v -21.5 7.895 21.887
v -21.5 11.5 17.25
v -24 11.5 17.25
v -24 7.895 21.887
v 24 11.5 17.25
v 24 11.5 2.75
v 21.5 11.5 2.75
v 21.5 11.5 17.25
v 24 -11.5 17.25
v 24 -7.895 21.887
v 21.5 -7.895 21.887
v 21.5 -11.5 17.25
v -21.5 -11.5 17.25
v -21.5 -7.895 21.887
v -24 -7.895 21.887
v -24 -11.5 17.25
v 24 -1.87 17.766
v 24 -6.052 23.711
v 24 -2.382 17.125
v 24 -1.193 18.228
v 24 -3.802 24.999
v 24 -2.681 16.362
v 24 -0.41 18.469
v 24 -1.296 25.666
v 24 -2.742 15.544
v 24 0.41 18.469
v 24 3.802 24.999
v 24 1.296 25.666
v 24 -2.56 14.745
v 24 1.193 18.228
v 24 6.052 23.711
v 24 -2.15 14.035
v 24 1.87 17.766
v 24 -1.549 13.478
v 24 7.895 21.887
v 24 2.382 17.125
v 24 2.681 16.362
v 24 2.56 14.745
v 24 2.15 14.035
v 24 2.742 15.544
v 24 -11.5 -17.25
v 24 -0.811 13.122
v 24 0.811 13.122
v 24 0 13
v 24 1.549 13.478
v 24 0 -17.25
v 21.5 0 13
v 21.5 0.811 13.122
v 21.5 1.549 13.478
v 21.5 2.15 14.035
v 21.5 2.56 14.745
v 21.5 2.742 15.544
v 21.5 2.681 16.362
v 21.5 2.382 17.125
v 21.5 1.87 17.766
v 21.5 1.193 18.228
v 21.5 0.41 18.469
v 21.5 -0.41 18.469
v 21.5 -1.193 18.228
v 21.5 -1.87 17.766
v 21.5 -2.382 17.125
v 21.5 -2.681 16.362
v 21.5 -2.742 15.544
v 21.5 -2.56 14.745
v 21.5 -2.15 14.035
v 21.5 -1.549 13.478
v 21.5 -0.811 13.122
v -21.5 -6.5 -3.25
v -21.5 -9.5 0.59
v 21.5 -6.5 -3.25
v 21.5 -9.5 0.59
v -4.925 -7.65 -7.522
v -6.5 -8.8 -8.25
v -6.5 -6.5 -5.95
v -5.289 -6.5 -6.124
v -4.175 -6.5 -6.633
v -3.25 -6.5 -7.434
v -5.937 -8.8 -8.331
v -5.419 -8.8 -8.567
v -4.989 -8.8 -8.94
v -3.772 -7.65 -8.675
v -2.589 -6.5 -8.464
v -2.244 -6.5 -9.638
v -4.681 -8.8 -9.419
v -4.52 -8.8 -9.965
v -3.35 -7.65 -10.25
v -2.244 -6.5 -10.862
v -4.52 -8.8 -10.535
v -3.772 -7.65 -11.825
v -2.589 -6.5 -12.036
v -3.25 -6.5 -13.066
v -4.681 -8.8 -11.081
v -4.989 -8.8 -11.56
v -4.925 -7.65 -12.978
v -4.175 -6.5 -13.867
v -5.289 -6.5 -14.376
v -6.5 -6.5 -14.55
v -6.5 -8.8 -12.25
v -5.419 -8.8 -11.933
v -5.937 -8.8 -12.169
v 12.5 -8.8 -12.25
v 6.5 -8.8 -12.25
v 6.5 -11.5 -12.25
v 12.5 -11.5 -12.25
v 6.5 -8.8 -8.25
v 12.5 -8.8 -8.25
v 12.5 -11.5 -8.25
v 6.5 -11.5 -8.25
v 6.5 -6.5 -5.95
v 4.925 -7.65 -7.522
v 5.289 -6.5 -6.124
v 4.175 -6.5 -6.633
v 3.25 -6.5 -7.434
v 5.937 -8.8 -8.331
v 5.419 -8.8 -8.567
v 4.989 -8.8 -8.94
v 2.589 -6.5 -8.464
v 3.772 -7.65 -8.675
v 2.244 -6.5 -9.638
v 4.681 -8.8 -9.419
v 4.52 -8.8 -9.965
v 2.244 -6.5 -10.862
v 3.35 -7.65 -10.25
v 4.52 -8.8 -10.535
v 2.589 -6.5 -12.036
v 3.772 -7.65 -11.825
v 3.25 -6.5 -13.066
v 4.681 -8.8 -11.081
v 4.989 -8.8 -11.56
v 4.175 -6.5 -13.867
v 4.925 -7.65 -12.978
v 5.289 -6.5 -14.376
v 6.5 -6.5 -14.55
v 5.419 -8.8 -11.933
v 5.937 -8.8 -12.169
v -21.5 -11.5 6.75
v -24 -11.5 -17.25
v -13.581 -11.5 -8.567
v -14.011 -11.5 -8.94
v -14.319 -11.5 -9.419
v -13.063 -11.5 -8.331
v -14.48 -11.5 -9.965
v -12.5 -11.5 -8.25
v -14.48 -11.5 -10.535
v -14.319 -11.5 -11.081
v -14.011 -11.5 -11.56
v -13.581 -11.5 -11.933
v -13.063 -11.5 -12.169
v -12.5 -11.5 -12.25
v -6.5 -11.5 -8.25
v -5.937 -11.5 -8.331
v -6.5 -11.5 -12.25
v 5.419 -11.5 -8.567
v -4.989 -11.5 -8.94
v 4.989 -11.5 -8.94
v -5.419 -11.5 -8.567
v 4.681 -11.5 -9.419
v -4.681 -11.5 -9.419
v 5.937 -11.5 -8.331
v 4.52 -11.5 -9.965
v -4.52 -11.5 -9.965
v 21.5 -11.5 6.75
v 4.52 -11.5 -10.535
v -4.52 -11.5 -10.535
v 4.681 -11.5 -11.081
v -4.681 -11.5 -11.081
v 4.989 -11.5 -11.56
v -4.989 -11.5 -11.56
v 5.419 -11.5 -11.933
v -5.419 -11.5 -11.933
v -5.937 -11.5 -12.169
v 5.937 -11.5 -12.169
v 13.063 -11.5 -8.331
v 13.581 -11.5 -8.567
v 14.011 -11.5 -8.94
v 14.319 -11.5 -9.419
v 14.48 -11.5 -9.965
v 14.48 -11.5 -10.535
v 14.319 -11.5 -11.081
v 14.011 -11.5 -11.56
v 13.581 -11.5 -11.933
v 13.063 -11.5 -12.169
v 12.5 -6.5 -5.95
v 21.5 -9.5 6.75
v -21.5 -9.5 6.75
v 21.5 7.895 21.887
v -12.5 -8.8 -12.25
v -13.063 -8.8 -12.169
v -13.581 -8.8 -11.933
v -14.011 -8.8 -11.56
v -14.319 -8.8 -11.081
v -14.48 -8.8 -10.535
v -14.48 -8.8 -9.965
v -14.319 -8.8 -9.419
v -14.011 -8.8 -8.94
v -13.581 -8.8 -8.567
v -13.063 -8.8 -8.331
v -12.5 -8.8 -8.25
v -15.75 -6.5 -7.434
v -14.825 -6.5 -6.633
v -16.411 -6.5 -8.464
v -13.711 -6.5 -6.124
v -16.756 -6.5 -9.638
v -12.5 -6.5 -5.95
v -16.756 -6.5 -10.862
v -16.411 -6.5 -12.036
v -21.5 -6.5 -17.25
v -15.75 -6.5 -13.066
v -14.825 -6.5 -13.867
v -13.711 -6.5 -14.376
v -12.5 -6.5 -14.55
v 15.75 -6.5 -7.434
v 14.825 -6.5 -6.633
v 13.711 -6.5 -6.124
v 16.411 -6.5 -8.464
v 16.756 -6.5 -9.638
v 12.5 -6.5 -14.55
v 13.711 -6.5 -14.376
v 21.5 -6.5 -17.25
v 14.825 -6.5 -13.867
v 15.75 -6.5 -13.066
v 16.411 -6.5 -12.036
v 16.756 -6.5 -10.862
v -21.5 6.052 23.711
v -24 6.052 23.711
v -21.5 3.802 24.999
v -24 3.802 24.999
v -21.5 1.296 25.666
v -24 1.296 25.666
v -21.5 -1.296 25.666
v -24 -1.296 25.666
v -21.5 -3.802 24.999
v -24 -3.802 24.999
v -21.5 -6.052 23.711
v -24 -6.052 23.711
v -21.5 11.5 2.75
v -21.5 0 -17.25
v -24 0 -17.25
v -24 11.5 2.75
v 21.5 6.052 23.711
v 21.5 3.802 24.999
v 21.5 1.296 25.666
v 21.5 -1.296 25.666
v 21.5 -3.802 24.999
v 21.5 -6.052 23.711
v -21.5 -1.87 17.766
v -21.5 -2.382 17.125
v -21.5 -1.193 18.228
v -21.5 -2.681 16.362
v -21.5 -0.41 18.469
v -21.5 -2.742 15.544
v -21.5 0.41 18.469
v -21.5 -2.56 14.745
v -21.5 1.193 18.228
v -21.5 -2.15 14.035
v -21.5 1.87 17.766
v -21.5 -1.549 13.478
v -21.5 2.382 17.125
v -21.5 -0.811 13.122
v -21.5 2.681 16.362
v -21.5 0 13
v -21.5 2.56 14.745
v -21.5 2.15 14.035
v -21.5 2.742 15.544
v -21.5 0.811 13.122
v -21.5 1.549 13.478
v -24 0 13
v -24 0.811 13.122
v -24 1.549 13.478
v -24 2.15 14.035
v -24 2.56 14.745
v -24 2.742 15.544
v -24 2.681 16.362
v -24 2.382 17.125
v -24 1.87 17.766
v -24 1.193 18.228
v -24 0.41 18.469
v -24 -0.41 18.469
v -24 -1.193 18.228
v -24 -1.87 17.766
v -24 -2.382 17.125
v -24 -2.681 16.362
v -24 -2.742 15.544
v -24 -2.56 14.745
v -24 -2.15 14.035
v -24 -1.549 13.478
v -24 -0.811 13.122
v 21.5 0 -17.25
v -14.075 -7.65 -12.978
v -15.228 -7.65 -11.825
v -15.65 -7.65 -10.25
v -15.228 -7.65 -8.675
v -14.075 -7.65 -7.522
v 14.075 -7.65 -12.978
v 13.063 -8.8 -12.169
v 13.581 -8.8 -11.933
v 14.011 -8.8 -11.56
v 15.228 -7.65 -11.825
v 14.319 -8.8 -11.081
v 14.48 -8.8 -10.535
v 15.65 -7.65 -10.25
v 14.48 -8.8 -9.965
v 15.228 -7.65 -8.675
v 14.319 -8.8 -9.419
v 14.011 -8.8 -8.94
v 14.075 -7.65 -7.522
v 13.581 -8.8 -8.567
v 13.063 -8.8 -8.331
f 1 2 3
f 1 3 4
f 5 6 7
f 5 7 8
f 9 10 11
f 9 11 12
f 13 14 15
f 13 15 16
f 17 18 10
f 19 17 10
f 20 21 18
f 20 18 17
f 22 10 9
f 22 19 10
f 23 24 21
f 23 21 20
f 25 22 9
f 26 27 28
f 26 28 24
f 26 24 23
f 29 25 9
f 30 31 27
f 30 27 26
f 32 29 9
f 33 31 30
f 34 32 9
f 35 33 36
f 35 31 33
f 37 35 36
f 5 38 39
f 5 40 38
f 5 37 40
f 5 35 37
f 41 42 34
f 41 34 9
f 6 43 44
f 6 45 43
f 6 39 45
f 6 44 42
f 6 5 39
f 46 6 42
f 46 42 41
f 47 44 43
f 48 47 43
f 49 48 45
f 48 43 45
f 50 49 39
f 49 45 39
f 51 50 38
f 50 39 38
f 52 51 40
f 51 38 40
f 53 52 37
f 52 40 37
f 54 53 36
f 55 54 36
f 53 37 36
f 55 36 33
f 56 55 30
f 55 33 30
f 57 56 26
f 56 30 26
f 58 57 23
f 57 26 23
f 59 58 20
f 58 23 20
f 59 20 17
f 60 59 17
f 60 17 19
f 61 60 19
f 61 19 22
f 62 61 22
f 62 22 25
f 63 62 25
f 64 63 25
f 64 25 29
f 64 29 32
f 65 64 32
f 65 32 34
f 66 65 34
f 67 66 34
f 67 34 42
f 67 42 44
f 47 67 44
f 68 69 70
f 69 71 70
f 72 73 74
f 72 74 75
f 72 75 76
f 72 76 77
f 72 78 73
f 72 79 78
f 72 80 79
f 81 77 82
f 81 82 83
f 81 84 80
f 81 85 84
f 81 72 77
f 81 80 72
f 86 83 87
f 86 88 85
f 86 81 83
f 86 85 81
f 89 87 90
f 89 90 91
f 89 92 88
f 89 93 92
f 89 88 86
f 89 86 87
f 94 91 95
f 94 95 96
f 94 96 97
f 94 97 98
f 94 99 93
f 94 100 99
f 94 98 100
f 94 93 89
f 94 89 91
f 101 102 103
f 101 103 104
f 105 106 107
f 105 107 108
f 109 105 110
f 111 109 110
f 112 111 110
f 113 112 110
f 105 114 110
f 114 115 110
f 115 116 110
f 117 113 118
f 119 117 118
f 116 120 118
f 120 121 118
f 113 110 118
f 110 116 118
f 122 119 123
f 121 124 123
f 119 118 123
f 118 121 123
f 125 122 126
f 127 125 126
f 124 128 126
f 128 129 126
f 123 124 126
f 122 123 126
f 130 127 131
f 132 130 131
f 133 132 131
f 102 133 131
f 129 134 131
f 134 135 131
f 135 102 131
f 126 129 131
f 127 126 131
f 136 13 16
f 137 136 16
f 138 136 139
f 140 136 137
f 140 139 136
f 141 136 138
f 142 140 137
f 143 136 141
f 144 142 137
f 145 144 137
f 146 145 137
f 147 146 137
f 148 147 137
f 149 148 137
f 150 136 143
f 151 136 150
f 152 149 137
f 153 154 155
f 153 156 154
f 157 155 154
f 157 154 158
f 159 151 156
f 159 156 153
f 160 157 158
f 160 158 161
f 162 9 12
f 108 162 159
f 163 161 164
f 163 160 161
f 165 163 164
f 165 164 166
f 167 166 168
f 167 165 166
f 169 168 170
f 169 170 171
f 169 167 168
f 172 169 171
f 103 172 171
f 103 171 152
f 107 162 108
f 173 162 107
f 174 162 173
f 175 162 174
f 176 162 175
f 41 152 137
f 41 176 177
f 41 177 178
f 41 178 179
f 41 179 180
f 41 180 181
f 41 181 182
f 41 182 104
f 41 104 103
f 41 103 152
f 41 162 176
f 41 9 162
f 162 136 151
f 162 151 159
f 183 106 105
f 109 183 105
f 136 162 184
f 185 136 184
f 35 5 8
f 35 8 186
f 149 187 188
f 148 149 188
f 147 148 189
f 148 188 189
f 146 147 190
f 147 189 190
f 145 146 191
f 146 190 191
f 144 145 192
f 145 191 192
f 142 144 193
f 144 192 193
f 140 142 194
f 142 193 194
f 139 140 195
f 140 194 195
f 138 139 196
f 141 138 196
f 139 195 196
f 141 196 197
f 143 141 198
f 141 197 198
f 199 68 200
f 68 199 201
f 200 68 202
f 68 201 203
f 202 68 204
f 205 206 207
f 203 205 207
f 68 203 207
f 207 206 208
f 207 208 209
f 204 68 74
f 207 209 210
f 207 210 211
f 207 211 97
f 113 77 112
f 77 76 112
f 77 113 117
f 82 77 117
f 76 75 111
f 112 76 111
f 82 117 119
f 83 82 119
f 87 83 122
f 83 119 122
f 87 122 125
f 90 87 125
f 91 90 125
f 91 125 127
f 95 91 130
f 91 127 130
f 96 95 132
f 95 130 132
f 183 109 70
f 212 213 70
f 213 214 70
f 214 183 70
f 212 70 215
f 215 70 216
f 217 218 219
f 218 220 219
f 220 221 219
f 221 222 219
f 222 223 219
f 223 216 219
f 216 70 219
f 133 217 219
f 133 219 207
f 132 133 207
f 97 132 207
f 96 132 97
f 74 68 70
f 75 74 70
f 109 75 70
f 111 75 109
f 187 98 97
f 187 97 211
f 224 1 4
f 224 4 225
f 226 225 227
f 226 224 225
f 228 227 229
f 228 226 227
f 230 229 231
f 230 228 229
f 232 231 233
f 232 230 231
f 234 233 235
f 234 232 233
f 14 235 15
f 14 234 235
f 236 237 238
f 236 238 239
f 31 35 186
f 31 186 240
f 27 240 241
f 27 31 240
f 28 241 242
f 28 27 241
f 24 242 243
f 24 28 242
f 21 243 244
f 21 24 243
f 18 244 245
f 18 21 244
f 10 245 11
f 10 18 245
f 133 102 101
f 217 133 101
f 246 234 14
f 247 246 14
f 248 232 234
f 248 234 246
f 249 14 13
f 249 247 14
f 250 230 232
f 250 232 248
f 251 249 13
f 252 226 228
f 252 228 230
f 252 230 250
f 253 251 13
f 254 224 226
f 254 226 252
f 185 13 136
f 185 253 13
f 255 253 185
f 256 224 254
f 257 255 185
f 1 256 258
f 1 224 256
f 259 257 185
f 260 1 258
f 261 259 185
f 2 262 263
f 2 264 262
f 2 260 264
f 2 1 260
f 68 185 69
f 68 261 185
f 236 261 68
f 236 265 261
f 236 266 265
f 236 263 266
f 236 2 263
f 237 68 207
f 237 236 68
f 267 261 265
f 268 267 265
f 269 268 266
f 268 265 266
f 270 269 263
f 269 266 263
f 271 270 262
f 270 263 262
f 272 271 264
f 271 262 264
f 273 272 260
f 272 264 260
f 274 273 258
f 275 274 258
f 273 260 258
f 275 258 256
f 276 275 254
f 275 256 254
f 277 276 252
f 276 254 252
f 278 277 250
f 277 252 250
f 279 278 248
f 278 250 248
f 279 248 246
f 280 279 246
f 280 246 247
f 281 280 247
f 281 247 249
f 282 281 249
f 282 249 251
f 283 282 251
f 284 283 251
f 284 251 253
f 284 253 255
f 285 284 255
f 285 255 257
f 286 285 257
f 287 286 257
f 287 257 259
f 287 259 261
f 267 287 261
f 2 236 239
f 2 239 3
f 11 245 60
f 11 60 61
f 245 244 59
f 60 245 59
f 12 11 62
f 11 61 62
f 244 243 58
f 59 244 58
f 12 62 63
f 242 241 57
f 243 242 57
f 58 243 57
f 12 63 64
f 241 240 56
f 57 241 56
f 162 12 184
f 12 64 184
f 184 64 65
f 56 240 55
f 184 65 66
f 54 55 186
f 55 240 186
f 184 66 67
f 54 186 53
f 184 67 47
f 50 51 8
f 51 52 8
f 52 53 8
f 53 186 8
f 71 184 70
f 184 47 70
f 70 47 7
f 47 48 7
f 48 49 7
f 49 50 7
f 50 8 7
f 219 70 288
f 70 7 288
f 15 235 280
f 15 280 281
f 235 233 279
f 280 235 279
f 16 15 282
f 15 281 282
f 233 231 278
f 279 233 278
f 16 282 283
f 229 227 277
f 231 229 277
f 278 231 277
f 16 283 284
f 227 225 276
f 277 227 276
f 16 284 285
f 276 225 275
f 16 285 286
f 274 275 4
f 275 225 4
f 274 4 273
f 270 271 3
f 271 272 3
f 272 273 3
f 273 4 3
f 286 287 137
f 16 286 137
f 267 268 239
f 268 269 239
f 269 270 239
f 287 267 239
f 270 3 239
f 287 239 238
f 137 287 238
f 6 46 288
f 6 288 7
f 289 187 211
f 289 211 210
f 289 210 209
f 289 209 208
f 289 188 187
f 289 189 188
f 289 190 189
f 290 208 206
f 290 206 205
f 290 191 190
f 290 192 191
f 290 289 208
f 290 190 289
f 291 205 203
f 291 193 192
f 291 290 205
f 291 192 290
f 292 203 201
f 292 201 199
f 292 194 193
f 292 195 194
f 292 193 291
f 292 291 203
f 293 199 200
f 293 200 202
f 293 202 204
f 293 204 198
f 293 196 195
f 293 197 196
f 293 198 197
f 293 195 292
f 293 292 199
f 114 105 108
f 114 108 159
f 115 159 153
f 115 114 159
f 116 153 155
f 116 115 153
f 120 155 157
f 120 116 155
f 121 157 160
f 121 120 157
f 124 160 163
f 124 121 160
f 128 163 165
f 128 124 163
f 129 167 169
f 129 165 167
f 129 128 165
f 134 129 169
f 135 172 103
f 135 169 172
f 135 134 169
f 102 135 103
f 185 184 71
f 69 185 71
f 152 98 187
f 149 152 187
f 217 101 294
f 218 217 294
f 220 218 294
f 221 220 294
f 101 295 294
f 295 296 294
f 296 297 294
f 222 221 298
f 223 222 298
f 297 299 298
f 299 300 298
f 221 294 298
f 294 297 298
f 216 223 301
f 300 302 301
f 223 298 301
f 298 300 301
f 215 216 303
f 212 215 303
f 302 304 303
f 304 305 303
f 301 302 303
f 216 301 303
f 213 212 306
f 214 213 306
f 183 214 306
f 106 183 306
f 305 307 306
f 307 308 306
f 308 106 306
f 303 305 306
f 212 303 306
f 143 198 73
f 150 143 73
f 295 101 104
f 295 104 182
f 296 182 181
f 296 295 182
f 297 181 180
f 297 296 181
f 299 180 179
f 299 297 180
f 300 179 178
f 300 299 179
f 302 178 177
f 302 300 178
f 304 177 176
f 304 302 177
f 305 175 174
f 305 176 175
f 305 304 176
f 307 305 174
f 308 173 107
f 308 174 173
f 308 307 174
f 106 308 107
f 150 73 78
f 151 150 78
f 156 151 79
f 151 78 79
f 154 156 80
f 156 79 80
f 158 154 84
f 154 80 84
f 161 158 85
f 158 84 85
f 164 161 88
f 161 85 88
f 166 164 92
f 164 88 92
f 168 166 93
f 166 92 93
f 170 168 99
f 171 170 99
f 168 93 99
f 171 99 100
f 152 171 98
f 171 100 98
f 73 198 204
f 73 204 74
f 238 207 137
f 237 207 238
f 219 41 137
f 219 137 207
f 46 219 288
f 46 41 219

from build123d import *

# Parameters (mm, degrees)
BOSS_EXTRUDE1_DEPTH      = 24
SKETCH2_R                = 2.75
CUT_EXTRUDE1_DEPTH       = 48
CUT_EXTRUDE2_DEPTH       = 21.5
CUT_EXTRUDE3_DEPTH       = 40.535585237
CHAMFER1_SIZE            = 2.3
CHAMFER1_OF_MIRROR1_SIZE = 2.3


with BuildPart() as part:
    # Sketch1 → Boss-Extrude1 (new, symmetric)
    with BuildSketch(Plane(origin=(0, 0, 0), x_dir=(0, 0, -1), z_dir=(1, 0, 0))):
        with BuildLine():
            Line((-17.25, 11.5), (-21.887338715, 7.895129733))
            ThreePointArc((-21.887338715, 7.895129733), (-25.75, 0), (-21.887338715, -7.895129733))
            Line((-21.887338715, -7.895129733), (-17.25, -11.5))
            Line((-17.25, -11.5), (17.25, -11.5))
            Line((17.25, -11.5), (17.25, 11.5))
            Line((17.25, 11.5), (-17.25, 11.5))
        make_face()
    extrude(amount=BOSS_EXTRUDE1_DEPTH, both=True)

    # Sketch2 → Cut-Extrude1 (cut)
    with BuildSketch(Plane(origin=(24, 0, 0), x_dir=(0, 0, -1), z_dir=(1, 0, 0))):
        with Locations((-15.75, 0)):
            Circle(SKETCH2_R)
        Polygon((17.25, 0), (-2.75, 11.5), (17.25, 11.5), align=None)
    extrude(amount=-CUT_EXTRUDE1_DEPTH, mode=Mode.SUBTRACT)

    # Sketch4 → Cut-Extrude2 (cut, symmetric)
    with BuildSketch(Plane(origin=(0, 0, 0), x_dir=(0, 0, -1), z_dir=(1, 0, 0))):
        with BuildLine():
            Line((17.25, -6.5), (17.25, 0))
            Line((17.25, 0), (-2.75, 11.5))
            Line((-2.75, 11.5), (-17.25, 11.5))
            Line((-17.25, 11.5), (-21.887338715, 7.895129733))
            ThreePointArc((-21.887338715, 7.895129733), (-25.75, 0), (-21.887338715, -7.895129733))
            Line((-21.887338715, -7.895129733), (-17.25, -11.5))
            Line((-17.25, -11.5), (-6.75, -11.5))
            Line((-6.75, -11.5), (-6.75, -9.5))
            Line((-6.75, -9.5), (-0.589824897, -9.5))
            Line((-0.589824897, -9.5), (3.25, -6.5))
            Line((3.25, -6.5), (17.25, -6.5))
        make_face()
    extrude(amount=CUT_EXTRUDE2_DEPTH, both=True, mode=Mode.SUBTRACT)

    # Sketch5 → Cut-Extrude3 (cut, through all)
    with BuildSketch(Plane(origin=(0, -6.5, 0), x_dir=(1, 0, 0), z_dir=(0, 1, 0))):
        with BuildLine():
            Line((6.5, 12.25), (12.5, 12.25))
            ThreePointArc((12.5, 12.25), (14.5, 10.25), (12.5, 8.25))
            Line((12.5, 8.25), (6.5, 8.25))
            ThreePointArc((6.5, 8.25), (4.5, 10.25), (6.5, 12.25))
        make_face()
    cut_extrude3 = extrude(amount=-CUT_EXTRUDE3_DEPTH, mode=Mode.SUBTRACT)

    # Chamfer1
    chamfer1_edges = [part.edges().sort_by_distance(p)[0] for p in [
        (4.5, -6.5, -10.25),
        (9.5, -6.5, -8.25),
        (14.5, -6.5, -10.25),
        (9.5, -6.5, -12.25),
    ]]
    chamfer(chamfer1_edges, length=CHAMFER1_SIZE)

    # Mirror1: Cut-Extrude3 across plane
    add(cut_extrude3.mirror(Plane(origin=(0, 0, 0), x_dir=(0, 0, 1), z_dir=(1, 0, 0))), mode=Mode.SUBTRACT)

    # Chamfer1 of Mirror1
    chamfer1_of_mirror1_edges = [part.edges().sort_by_distance(p)[0] for p in [
        (-4.5, -6.5, -10.25),
        (-9.5, -6.5, -8.25),
        (-14.5, -6.5, -10.25),
        (-9.5, -6.5, -12.25),
    ]]
    chamfer(chamfer1_of_mirror1_edges, length=CHAMFER1_OF_MIRROR1_SIZE)


solid = part.part
